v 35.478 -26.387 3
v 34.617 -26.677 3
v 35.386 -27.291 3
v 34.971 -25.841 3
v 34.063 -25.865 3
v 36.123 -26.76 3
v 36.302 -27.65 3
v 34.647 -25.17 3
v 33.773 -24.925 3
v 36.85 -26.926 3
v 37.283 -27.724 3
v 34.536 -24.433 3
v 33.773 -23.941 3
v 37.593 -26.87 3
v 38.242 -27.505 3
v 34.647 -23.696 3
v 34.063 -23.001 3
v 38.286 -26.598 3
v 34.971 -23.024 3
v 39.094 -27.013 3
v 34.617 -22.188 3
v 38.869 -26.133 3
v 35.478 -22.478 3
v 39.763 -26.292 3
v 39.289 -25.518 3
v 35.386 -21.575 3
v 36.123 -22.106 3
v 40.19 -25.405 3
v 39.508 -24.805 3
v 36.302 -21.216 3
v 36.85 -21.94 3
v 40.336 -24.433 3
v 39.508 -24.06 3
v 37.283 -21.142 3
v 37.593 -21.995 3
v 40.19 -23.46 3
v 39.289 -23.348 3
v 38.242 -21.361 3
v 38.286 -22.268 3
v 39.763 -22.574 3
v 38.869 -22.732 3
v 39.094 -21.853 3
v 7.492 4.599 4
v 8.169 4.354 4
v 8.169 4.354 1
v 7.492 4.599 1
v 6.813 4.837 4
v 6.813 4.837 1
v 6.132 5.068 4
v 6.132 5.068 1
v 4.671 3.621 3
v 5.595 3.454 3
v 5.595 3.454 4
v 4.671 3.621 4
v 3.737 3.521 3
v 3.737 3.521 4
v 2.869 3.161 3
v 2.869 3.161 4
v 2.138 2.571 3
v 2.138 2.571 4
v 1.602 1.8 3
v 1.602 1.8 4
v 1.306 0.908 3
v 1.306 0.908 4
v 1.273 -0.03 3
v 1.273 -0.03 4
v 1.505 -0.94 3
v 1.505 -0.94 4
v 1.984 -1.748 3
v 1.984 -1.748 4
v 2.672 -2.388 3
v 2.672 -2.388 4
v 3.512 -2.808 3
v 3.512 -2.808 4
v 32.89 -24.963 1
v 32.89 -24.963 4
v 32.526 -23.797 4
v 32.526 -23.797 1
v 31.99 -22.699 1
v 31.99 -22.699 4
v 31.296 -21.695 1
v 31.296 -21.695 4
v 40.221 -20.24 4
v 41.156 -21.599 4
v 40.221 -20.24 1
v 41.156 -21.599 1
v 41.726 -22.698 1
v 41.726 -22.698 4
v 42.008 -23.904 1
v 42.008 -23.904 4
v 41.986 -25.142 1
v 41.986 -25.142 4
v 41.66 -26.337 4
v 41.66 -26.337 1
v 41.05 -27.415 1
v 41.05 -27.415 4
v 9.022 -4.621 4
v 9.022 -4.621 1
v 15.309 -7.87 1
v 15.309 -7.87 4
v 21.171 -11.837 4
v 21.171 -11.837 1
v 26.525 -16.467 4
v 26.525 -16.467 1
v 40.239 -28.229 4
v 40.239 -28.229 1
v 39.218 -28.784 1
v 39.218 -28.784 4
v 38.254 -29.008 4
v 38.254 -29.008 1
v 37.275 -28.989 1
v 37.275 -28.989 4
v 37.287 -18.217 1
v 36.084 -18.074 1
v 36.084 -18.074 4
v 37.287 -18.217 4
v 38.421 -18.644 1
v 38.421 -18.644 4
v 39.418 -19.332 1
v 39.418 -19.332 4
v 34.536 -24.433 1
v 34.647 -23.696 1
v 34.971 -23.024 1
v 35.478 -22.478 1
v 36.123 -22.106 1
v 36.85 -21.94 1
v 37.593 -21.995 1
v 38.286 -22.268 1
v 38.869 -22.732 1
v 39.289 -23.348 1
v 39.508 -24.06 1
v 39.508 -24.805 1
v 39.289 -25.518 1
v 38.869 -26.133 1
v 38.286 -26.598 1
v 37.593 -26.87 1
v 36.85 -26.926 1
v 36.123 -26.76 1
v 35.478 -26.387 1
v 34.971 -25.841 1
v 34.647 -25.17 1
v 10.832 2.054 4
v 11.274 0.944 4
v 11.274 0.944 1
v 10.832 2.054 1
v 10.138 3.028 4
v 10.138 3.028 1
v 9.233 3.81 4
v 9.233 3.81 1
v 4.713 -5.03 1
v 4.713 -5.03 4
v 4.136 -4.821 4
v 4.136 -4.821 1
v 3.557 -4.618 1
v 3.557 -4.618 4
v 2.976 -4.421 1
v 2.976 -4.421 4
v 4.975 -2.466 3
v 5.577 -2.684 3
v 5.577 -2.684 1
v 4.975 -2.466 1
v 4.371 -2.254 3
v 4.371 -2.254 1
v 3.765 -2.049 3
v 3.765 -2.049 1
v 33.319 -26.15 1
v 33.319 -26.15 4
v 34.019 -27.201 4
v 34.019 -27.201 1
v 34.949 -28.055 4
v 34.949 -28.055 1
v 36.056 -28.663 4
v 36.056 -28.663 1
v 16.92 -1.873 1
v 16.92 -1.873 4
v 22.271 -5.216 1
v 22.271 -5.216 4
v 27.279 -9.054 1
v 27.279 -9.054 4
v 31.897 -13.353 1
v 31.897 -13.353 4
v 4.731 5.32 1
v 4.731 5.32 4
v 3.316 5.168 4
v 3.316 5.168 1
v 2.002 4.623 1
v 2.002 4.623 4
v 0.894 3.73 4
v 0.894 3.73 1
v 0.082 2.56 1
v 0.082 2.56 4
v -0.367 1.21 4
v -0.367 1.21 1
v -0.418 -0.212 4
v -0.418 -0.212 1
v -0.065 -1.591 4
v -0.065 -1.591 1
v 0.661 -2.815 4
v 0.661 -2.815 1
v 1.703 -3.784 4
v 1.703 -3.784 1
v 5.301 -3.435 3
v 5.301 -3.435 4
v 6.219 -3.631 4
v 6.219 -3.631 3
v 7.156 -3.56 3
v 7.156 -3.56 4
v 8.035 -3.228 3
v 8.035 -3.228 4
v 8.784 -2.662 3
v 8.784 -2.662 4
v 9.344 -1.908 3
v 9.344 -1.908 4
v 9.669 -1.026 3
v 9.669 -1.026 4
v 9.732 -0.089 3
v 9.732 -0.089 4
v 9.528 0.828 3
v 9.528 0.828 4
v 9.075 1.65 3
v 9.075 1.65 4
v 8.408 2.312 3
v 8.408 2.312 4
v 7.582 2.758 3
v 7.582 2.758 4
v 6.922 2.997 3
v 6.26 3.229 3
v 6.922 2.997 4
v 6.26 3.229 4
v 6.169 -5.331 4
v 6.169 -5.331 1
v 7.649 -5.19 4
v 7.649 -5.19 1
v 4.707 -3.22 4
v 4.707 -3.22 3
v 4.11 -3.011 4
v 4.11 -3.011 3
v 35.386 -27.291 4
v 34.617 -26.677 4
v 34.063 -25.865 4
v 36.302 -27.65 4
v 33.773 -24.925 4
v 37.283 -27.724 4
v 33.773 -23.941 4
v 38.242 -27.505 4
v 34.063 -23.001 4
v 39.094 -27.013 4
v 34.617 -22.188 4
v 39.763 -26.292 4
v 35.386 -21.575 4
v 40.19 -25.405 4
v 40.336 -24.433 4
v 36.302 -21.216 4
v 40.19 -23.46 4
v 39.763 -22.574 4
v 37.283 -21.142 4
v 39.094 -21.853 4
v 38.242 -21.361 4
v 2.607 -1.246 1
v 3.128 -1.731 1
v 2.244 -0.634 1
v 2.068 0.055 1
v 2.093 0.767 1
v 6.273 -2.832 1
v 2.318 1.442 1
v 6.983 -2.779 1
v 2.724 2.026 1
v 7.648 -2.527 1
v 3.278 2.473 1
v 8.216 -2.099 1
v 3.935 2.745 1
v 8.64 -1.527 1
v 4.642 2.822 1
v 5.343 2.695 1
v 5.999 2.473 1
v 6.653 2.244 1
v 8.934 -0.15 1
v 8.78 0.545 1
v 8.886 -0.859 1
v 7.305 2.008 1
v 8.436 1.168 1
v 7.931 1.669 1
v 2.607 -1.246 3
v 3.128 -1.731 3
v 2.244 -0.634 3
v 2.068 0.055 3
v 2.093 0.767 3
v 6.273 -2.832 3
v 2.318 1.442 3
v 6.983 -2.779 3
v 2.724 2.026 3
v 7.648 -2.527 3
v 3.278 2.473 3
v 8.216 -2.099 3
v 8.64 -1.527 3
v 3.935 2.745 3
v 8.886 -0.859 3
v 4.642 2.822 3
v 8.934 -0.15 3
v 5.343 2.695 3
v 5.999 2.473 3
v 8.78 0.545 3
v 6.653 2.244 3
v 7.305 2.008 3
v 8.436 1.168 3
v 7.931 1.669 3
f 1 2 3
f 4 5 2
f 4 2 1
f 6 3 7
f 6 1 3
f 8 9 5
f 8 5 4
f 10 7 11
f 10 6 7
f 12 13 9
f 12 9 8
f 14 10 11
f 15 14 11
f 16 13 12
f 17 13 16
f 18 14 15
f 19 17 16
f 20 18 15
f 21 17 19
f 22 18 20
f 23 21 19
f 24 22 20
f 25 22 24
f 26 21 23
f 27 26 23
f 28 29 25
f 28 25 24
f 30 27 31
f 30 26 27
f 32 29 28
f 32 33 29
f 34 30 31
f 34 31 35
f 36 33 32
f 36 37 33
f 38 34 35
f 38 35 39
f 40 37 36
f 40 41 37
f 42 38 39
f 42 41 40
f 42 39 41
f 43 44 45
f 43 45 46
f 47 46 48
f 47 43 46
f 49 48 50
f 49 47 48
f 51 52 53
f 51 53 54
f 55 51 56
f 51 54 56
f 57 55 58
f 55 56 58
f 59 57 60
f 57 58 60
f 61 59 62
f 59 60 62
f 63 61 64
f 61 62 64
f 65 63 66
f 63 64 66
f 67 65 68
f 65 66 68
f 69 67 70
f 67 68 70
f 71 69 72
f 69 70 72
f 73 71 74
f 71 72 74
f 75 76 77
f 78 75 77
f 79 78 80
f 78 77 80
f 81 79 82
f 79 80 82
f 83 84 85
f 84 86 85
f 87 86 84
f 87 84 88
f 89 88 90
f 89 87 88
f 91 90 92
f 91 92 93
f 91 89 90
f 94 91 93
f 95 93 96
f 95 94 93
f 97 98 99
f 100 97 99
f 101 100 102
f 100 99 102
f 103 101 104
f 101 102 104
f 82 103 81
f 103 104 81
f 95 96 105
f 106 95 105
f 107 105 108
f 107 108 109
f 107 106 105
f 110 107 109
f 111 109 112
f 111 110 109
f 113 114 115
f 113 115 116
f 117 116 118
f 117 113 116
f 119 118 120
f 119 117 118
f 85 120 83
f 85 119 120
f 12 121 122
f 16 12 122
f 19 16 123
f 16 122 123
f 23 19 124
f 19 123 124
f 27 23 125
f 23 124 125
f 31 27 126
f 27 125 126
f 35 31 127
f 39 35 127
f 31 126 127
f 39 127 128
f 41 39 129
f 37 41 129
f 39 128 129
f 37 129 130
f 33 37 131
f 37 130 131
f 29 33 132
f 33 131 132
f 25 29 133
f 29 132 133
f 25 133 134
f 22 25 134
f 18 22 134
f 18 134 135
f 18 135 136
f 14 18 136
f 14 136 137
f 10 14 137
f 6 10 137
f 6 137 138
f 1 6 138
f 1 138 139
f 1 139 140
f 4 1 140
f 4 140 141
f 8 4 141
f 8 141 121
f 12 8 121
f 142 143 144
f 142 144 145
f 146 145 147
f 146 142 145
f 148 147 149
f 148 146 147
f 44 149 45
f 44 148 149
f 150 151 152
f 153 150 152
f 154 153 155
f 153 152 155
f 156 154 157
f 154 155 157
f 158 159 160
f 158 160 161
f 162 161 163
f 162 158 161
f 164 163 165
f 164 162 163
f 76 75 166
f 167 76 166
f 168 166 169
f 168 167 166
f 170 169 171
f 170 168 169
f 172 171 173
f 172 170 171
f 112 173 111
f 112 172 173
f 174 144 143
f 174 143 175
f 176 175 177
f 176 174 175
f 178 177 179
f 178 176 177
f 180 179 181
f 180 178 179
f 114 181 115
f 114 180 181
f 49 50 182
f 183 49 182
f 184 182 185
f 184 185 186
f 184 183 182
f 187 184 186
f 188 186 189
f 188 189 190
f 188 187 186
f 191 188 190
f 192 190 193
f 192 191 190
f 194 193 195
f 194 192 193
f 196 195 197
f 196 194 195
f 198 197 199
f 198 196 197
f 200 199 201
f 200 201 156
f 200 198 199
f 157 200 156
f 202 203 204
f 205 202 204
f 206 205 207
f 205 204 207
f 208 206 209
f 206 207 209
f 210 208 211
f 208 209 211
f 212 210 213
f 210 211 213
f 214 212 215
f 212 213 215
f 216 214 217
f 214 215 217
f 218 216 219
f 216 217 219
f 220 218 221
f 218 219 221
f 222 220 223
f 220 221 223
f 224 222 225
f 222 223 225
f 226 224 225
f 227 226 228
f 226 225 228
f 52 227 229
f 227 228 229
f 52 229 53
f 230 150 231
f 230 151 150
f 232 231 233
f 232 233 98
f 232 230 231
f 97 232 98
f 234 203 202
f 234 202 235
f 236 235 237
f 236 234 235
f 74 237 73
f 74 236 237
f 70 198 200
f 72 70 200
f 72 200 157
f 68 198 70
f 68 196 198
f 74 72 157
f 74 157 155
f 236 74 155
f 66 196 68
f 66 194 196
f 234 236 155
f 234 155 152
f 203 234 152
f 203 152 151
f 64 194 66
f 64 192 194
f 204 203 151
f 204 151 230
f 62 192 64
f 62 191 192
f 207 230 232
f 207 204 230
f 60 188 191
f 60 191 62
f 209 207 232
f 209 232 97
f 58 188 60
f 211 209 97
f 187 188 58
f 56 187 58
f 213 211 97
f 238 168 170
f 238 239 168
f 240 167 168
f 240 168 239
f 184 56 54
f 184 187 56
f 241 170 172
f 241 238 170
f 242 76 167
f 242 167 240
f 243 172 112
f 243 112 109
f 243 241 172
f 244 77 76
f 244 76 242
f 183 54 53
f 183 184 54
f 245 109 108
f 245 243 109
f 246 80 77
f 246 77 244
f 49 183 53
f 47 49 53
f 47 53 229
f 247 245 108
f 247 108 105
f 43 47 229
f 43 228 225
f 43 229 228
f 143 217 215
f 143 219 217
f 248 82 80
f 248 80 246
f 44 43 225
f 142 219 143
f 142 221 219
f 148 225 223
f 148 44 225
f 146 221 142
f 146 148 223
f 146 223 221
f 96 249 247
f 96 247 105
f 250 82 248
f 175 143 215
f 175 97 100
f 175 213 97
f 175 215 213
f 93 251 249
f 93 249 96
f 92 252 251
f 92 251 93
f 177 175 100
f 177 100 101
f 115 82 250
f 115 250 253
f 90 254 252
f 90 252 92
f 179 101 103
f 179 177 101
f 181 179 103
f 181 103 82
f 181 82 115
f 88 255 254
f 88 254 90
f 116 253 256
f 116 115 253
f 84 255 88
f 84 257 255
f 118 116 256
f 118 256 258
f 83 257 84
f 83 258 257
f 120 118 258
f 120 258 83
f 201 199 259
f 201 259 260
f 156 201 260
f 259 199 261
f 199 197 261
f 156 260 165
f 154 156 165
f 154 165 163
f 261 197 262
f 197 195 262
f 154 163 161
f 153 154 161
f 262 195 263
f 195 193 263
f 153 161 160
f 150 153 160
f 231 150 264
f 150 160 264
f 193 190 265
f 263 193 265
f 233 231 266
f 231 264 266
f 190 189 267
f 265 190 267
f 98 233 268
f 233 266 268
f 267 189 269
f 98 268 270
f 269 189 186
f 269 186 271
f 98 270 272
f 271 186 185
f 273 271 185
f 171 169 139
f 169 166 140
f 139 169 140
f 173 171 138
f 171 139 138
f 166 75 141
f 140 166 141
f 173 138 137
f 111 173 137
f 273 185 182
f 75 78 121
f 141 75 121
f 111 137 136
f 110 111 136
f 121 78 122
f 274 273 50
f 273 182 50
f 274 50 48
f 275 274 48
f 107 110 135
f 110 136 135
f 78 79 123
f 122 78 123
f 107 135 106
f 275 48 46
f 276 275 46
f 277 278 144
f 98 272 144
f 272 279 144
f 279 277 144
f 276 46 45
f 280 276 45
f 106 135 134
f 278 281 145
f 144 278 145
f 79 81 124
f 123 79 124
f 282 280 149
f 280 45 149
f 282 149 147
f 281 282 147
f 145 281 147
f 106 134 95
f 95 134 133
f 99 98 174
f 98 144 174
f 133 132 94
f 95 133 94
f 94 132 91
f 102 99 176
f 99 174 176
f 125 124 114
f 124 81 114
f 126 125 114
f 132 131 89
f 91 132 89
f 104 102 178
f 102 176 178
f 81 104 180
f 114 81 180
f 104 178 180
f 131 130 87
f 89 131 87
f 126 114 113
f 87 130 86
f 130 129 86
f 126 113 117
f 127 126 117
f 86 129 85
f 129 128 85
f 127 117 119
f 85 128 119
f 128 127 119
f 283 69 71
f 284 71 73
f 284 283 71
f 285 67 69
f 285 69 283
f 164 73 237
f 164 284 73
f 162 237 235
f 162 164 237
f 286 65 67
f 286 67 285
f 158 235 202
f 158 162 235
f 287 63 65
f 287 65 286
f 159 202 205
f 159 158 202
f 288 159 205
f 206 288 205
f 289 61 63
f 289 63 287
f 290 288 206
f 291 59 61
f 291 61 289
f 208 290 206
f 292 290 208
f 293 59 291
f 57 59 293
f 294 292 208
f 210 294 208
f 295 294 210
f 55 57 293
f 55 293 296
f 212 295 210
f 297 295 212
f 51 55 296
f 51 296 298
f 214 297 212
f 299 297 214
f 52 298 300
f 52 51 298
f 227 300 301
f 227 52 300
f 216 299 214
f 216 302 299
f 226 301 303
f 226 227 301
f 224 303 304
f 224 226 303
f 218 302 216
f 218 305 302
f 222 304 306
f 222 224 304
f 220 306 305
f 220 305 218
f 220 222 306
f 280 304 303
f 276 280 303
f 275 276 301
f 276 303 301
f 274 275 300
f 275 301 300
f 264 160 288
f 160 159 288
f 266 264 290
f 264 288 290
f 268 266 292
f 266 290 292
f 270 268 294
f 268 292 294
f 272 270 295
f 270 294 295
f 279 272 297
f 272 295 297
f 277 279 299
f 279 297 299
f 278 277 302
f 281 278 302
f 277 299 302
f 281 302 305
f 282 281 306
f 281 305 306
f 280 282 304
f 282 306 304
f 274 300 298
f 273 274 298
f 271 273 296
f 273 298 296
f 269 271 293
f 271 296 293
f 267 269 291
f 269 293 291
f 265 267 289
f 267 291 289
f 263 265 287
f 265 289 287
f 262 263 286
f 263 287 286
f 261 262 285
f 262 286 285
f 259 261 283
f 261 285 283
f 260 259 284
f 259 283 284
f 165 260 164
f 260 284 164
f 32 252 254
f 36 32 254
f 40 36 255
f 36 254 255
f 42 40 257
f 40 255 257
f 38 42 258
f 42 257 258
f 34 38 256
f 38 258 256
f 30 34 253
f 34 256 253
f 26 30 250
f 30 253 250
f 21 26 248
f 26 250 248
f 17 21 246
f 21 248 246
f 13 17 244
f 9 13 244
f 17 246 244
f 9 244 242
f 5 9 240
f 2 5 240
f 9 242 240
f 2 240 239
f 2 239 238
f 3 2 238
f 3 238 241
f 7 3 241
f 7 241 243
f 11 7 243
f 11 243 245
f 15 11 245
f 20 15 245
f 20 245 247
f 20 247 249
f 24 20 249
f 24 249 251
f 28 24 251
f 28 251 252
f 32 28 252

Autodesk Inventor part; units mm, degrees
ref_plane "YZ Plane" through (0, 0, 0) normal (1, 0, 0) x (0, 1, 0)
ref_plane "XZ Plane" through (0, 0, 0) normal (0, 1, 0) x (-1, 0, 0)
ref_plane "Work Plane1" through (37.0364, -24.4328, 1) normal (0, 0, 1) x (1, 0, 0)
sketch "Sketch2" plane through (37.0364, -24.4328, 1) normal (0, 0, 1) x (1, 0, 0)
  circle A0 centre (0, 0) radius 3 construction
  circle A1 centre (0, 0) radius 1.25 projected
  circle A2 centre (-31.5364, 24.4328) radius 3 construction
  circle A3 centre (-31.5364, 24.4328) radius 1.4795 projected
  circle A4 centre (0, 0) radius 1.25 projected
  circle A5 centre (-31.5364, 24.4328) radius 1.4795 projected
  arc A6 (0, 0) -> (-31.5364, 24.4328) centre (-52.3674, -35.0237) ccw construction
  arc A7 (2.4937, 1.6678) -> (-30.5445, 27.264) centre (-52.3674, -35.0237) ccw
  arc A8 (-2.4937, -1.6678) -> (-32.5284, 21.6015) centre (-52.3674, -35.0237) ccw
  arc A9 (-2.4937, -1.6678) -> (2.4937, 1.6678) centre (0, 0) ccw
  arc A10 (-30.5445, 27.264) -> (-32.5284, 21.6015) centre (-31.5364, 24.4328) ccw
  point P0 (-37.0364, 24.4328)
  dimension "d3" = 60
extrude "Extrusion2" add sketch "Sketch2" along normal blind 3
sketch "Sketch4" plane through (5.5, 0, 4) normal (0, 0, 1) x (1, 0, 0)
  arc A0 (29.0427, -26.1006) -> (-0.992, -2.8313) centre (-20.831, -59.4565) ccw construction
  arc A1 (34.0301, -22.765) -> (0.992, 2.8313) centre (-20.831, -59.4565) ccw construction
  circle A2 centre (0, 0) radius 3 construction
  circle A3 centre (0, 0) radius 1.4795 construction
  arc A4 (0.9411, -0.3381) -> (-0.9463, 0.3231) centre (-20.831, -59.4565) ccw construction
  arc A5 (2.669, 4.3538) -> (0.6318, 5.0676) centre (-20.831, -59.4565) ccw
  arc A6 (-0.7868, -5.0301) -> (-2.5245, -4.4213) centre (-20.831, -59.4565) ccw
  arc A7 (-0.7868, -5.0301) -> (2.669, 4.3538) centre (0.9411, -0.3381) ccw
  arc A8 (0.6318, 5.0676) -> (-2.5245, -4.4213) centre (-0.9463, 0.3231) ccw
  arc A9 (0.992, 2.8313) -> (-0.992, -2.8313) centre (0, 0) ccw projected
  arc A10 (29.0427, -26.1006) -> (34.0301, -22.765) centre (31.5364, -24.4328) ccw projected
  dimension "d15" = 10
  dimension "d30" = 1
  dimension "d31" = 1
extrude "Extrusion4" add sketch "Sketch4" against normal blind 3
sketch "Sketch5" plane through (37.0364, -24.4328, 4) normal (0, 0, 1) x (1, 0, 0)
  arc A0 (-30.5953, 24.0947) -> (-32.4828, 24.7559) centre (-52.3674, -35.0237) ccw construction
  arc A1 (-29.7313, 26.4406) -> (-31.6937, 27.1281) centre (-52.3674, -35.0237) ccw
  arc A2 (-31.4593, 21.7487) -> (-33.2718, 22.3837) centre (-52.3674, -35.0237) ccw
  arc A3 (-31.4593, 21.7487) -> (-29.7313, 26.4406) centre (-30.5953, 24.0947) ccw
  arc A4 (-31.6937, 27.1281) -> (-33.2718, 22.3837) centre (-32.4828, 24.7559) ccw
  arc A5 (-30.9046, 29.5004) -> (-34.0609, 20.0115) centre (-32.4828, 24.7559) ccw projected
  arc A6 (-32.3233, 19.4027) -> (-34.0609, 20.0115) centre (-52.3674, -35.0237) ccw projected
  arc A7 (-28.8674, 28.7866) -> (-30.9046, 29.5004) centre (-52.3674, -35.0237) ccw projected
  arc A8 (-25.7624, 25.3765) -> (-28.8674, 28.7866) centre (-30.5953, 24.0947) ccw projected
  arc A9 (-32.3233, 19.4027) -> (-28.0148, 19.812) centre (-30.5953, 24.0947) ccw projected
  arc A10 (-29.4549, 27.1913) -> (-31.4412, 27.8873) centre (-52.3674, -35.0237) ccw
  arc A11 (-31.4412, 27.8873) -> (-33.5243, 21.6246) centre (-32.4828, 24.7559) ccw
  arc A12 (-31.7358, 20.998) -> (-33.5243, 21.6246) centre (-52.3674, -35.0237) ccw
  arc A13 (-31.7358, 20.998) -> (-29.4549, 27.1913) centre (-30.5953, 24.0947) ccw
  dimension "d18" = 5
  dimension "d35" = 0.8
extrude "Extrusion5" cut sketch "Sketch5" against normal blind 5 contours A3 A2 A4 A1
sketch "Sketch6" plane through (37.0364, -24.4328, 1) normal (0, 0, -1) x (-1, 0, 0)
  circle A0 centre (0, 0) radius 1.25 projected
  circle A1 centre (0, 0) radius 2.5
  arc A2 (-4.1194, 2.8338) -> (4.1194, -2.8338) centre (0, 0) ccw
  arc A3 (31.5364, 24.4328) -> (0, 0) centre (52.3674, -35.0237) ccw construction
  arc A4 (5.0542, -1.475) -> (-3.1846, 4.1926) centre (0.9348, 1.3588) ccw
  line L0 (-4.1194, 2.8338) -> (-3.1846, 4.1926)
  line L1 (4.1194, -2.8338) -> (5.0542, -1.475)
  line L2 (-0.7345, 0.4913) -> (0.6872, -0.4596) construction
  line L3 (1.7213, 0.8024) -> (-0.0122, 2.0287) construction
  circle A5 centre (0, 0) radius 3.3
  point P0 (37.0364, 24.4328)
  dimension "d19" = 5
  dimension "d22" = 10
  dimension "d29" = 1.5
  dimension "d32" = 6.6
extrude "Extrusion6" cut sketch "Sketch6" against normal up to surface (3 mm away) contours A1
extrude "Extrusion7" add sketch "Sketch6" against normal up to surface (3 mm away) contours L0 A4 L1 A2 | A5
sketch "Sketch7" plane through (37.0364, -24.4328, 4) normal (0, 0, 1) x (1, 0, 0)
  circle A0 centre (0, 0) radius 3.3 projected
  point P0 (-37.0364, 24.4328)
extrude "Extrusion8" cut sketch "Sketch7" against normal blind 1
extrude "Extrusion9" cut sketch "Sketch5" against normal blind 1
sketch "Sketch8" plane through (37.0364, -24.4328, 4) normal (0, 0, 1) x (1, 0, 0)
  arc A0 (-4.1194, -2.8338) -> (4.1194, 2.8338) centre (0, 0) ccw projected
  arc A1 (-4.1466, -0.5304) -> (2.2951, -4.4421) centre (0.9806, 0.653) ccw
  arc A2 (-5.7407, 2.7382) -> (-28.0148, 19.812) centre (-52.3674, -35.0237) ccw projected
  arc A3 (-4.1466, -0.5304) -> (-5.7407, 2.7382) centre (-12.0206, -2.3478) ccw
  arc A4 (-31.4412, 27.8873) -> (-33.5243, 21.6246) centre (-32.4828, 24.7559) ccw projected
  arc A5 (-29.4549, 27.1913) -> (-31.4412, 27.8873) centre (-52.3674, -35.0237) ccw projected
  arc A6 (-31.7358, 20.998) -> (-29.4549, 27.1913) centre (-30.5953, 24.0947) ccw projected
  arc A7 (-31.7358, 20.998) -> (-33.5243, 21.6246) centre (-52.3674, -35.0237) ccw projected
  circle A8 centre (0, 0) radius 3.3 projected
  arc A9 (-0.9525, 6.3588) -> (-25.7624, 25.3765) centre (-52.3674, -35.0237) ccw projected
  arc A10 (-25.7624, 25.3765) -> (-28.8674, 28.7866) centre (-30.5953, 24.0947) ccw projected
  arc A11 (-28.8674, 28.7866) -> (-30.9046, 29.5004) centre (-52.3674, -35.0237) ccw projected
  arc A12 (-30.9046, 29.5004) -> (-34.0609, 20.0115) centre (-32.4828, 24.7559) ccw projected
  arc A13 (-32.3233, 19.4027) -> (-34.0609, 20.0115) centre (-52.3674, -35.0237) ccw projected
  arc A14 (-32.3233, 19.4027) -> (-28.0148, 19.812) centre (-30.5953, 24.0947) ccw projected
  arc A15 (-5.7407, 2.7382) -> (-28.0148, 19.812) centre (-52.3674, -35.0237) ccw projected
  arc A16 (-5.7407, 2.7382) -> (-5.0542, -1.475) centre (-0.9348, 1.3588) ccw projected
  line L0 (-4.1194, -2.8338) -> (-5.0542, -1.475) projected
  arc A17 (-4.1194, -2.8338) -> (4.1194, 2.8338) centre (0, 0) ccw projected
  line L1 (3.1846, 4.1926) -> (4.1194, 2.8338) projected
  arc A18 (3.1846, 4.1926) -> (-0.9525, 6.3588) centre (-0.9348, 1.3588) ccw projected
  point P0 (-37.0364, 24.4328)
extrude "Extrusion10" cut sketch "Sketch8" against normal up to surface (3 mm away) contours L0 A16 A3 A1 A0
fillet "Fillet1" radius 4 1 edges at (39.3315, -28.8749, 2.5)
